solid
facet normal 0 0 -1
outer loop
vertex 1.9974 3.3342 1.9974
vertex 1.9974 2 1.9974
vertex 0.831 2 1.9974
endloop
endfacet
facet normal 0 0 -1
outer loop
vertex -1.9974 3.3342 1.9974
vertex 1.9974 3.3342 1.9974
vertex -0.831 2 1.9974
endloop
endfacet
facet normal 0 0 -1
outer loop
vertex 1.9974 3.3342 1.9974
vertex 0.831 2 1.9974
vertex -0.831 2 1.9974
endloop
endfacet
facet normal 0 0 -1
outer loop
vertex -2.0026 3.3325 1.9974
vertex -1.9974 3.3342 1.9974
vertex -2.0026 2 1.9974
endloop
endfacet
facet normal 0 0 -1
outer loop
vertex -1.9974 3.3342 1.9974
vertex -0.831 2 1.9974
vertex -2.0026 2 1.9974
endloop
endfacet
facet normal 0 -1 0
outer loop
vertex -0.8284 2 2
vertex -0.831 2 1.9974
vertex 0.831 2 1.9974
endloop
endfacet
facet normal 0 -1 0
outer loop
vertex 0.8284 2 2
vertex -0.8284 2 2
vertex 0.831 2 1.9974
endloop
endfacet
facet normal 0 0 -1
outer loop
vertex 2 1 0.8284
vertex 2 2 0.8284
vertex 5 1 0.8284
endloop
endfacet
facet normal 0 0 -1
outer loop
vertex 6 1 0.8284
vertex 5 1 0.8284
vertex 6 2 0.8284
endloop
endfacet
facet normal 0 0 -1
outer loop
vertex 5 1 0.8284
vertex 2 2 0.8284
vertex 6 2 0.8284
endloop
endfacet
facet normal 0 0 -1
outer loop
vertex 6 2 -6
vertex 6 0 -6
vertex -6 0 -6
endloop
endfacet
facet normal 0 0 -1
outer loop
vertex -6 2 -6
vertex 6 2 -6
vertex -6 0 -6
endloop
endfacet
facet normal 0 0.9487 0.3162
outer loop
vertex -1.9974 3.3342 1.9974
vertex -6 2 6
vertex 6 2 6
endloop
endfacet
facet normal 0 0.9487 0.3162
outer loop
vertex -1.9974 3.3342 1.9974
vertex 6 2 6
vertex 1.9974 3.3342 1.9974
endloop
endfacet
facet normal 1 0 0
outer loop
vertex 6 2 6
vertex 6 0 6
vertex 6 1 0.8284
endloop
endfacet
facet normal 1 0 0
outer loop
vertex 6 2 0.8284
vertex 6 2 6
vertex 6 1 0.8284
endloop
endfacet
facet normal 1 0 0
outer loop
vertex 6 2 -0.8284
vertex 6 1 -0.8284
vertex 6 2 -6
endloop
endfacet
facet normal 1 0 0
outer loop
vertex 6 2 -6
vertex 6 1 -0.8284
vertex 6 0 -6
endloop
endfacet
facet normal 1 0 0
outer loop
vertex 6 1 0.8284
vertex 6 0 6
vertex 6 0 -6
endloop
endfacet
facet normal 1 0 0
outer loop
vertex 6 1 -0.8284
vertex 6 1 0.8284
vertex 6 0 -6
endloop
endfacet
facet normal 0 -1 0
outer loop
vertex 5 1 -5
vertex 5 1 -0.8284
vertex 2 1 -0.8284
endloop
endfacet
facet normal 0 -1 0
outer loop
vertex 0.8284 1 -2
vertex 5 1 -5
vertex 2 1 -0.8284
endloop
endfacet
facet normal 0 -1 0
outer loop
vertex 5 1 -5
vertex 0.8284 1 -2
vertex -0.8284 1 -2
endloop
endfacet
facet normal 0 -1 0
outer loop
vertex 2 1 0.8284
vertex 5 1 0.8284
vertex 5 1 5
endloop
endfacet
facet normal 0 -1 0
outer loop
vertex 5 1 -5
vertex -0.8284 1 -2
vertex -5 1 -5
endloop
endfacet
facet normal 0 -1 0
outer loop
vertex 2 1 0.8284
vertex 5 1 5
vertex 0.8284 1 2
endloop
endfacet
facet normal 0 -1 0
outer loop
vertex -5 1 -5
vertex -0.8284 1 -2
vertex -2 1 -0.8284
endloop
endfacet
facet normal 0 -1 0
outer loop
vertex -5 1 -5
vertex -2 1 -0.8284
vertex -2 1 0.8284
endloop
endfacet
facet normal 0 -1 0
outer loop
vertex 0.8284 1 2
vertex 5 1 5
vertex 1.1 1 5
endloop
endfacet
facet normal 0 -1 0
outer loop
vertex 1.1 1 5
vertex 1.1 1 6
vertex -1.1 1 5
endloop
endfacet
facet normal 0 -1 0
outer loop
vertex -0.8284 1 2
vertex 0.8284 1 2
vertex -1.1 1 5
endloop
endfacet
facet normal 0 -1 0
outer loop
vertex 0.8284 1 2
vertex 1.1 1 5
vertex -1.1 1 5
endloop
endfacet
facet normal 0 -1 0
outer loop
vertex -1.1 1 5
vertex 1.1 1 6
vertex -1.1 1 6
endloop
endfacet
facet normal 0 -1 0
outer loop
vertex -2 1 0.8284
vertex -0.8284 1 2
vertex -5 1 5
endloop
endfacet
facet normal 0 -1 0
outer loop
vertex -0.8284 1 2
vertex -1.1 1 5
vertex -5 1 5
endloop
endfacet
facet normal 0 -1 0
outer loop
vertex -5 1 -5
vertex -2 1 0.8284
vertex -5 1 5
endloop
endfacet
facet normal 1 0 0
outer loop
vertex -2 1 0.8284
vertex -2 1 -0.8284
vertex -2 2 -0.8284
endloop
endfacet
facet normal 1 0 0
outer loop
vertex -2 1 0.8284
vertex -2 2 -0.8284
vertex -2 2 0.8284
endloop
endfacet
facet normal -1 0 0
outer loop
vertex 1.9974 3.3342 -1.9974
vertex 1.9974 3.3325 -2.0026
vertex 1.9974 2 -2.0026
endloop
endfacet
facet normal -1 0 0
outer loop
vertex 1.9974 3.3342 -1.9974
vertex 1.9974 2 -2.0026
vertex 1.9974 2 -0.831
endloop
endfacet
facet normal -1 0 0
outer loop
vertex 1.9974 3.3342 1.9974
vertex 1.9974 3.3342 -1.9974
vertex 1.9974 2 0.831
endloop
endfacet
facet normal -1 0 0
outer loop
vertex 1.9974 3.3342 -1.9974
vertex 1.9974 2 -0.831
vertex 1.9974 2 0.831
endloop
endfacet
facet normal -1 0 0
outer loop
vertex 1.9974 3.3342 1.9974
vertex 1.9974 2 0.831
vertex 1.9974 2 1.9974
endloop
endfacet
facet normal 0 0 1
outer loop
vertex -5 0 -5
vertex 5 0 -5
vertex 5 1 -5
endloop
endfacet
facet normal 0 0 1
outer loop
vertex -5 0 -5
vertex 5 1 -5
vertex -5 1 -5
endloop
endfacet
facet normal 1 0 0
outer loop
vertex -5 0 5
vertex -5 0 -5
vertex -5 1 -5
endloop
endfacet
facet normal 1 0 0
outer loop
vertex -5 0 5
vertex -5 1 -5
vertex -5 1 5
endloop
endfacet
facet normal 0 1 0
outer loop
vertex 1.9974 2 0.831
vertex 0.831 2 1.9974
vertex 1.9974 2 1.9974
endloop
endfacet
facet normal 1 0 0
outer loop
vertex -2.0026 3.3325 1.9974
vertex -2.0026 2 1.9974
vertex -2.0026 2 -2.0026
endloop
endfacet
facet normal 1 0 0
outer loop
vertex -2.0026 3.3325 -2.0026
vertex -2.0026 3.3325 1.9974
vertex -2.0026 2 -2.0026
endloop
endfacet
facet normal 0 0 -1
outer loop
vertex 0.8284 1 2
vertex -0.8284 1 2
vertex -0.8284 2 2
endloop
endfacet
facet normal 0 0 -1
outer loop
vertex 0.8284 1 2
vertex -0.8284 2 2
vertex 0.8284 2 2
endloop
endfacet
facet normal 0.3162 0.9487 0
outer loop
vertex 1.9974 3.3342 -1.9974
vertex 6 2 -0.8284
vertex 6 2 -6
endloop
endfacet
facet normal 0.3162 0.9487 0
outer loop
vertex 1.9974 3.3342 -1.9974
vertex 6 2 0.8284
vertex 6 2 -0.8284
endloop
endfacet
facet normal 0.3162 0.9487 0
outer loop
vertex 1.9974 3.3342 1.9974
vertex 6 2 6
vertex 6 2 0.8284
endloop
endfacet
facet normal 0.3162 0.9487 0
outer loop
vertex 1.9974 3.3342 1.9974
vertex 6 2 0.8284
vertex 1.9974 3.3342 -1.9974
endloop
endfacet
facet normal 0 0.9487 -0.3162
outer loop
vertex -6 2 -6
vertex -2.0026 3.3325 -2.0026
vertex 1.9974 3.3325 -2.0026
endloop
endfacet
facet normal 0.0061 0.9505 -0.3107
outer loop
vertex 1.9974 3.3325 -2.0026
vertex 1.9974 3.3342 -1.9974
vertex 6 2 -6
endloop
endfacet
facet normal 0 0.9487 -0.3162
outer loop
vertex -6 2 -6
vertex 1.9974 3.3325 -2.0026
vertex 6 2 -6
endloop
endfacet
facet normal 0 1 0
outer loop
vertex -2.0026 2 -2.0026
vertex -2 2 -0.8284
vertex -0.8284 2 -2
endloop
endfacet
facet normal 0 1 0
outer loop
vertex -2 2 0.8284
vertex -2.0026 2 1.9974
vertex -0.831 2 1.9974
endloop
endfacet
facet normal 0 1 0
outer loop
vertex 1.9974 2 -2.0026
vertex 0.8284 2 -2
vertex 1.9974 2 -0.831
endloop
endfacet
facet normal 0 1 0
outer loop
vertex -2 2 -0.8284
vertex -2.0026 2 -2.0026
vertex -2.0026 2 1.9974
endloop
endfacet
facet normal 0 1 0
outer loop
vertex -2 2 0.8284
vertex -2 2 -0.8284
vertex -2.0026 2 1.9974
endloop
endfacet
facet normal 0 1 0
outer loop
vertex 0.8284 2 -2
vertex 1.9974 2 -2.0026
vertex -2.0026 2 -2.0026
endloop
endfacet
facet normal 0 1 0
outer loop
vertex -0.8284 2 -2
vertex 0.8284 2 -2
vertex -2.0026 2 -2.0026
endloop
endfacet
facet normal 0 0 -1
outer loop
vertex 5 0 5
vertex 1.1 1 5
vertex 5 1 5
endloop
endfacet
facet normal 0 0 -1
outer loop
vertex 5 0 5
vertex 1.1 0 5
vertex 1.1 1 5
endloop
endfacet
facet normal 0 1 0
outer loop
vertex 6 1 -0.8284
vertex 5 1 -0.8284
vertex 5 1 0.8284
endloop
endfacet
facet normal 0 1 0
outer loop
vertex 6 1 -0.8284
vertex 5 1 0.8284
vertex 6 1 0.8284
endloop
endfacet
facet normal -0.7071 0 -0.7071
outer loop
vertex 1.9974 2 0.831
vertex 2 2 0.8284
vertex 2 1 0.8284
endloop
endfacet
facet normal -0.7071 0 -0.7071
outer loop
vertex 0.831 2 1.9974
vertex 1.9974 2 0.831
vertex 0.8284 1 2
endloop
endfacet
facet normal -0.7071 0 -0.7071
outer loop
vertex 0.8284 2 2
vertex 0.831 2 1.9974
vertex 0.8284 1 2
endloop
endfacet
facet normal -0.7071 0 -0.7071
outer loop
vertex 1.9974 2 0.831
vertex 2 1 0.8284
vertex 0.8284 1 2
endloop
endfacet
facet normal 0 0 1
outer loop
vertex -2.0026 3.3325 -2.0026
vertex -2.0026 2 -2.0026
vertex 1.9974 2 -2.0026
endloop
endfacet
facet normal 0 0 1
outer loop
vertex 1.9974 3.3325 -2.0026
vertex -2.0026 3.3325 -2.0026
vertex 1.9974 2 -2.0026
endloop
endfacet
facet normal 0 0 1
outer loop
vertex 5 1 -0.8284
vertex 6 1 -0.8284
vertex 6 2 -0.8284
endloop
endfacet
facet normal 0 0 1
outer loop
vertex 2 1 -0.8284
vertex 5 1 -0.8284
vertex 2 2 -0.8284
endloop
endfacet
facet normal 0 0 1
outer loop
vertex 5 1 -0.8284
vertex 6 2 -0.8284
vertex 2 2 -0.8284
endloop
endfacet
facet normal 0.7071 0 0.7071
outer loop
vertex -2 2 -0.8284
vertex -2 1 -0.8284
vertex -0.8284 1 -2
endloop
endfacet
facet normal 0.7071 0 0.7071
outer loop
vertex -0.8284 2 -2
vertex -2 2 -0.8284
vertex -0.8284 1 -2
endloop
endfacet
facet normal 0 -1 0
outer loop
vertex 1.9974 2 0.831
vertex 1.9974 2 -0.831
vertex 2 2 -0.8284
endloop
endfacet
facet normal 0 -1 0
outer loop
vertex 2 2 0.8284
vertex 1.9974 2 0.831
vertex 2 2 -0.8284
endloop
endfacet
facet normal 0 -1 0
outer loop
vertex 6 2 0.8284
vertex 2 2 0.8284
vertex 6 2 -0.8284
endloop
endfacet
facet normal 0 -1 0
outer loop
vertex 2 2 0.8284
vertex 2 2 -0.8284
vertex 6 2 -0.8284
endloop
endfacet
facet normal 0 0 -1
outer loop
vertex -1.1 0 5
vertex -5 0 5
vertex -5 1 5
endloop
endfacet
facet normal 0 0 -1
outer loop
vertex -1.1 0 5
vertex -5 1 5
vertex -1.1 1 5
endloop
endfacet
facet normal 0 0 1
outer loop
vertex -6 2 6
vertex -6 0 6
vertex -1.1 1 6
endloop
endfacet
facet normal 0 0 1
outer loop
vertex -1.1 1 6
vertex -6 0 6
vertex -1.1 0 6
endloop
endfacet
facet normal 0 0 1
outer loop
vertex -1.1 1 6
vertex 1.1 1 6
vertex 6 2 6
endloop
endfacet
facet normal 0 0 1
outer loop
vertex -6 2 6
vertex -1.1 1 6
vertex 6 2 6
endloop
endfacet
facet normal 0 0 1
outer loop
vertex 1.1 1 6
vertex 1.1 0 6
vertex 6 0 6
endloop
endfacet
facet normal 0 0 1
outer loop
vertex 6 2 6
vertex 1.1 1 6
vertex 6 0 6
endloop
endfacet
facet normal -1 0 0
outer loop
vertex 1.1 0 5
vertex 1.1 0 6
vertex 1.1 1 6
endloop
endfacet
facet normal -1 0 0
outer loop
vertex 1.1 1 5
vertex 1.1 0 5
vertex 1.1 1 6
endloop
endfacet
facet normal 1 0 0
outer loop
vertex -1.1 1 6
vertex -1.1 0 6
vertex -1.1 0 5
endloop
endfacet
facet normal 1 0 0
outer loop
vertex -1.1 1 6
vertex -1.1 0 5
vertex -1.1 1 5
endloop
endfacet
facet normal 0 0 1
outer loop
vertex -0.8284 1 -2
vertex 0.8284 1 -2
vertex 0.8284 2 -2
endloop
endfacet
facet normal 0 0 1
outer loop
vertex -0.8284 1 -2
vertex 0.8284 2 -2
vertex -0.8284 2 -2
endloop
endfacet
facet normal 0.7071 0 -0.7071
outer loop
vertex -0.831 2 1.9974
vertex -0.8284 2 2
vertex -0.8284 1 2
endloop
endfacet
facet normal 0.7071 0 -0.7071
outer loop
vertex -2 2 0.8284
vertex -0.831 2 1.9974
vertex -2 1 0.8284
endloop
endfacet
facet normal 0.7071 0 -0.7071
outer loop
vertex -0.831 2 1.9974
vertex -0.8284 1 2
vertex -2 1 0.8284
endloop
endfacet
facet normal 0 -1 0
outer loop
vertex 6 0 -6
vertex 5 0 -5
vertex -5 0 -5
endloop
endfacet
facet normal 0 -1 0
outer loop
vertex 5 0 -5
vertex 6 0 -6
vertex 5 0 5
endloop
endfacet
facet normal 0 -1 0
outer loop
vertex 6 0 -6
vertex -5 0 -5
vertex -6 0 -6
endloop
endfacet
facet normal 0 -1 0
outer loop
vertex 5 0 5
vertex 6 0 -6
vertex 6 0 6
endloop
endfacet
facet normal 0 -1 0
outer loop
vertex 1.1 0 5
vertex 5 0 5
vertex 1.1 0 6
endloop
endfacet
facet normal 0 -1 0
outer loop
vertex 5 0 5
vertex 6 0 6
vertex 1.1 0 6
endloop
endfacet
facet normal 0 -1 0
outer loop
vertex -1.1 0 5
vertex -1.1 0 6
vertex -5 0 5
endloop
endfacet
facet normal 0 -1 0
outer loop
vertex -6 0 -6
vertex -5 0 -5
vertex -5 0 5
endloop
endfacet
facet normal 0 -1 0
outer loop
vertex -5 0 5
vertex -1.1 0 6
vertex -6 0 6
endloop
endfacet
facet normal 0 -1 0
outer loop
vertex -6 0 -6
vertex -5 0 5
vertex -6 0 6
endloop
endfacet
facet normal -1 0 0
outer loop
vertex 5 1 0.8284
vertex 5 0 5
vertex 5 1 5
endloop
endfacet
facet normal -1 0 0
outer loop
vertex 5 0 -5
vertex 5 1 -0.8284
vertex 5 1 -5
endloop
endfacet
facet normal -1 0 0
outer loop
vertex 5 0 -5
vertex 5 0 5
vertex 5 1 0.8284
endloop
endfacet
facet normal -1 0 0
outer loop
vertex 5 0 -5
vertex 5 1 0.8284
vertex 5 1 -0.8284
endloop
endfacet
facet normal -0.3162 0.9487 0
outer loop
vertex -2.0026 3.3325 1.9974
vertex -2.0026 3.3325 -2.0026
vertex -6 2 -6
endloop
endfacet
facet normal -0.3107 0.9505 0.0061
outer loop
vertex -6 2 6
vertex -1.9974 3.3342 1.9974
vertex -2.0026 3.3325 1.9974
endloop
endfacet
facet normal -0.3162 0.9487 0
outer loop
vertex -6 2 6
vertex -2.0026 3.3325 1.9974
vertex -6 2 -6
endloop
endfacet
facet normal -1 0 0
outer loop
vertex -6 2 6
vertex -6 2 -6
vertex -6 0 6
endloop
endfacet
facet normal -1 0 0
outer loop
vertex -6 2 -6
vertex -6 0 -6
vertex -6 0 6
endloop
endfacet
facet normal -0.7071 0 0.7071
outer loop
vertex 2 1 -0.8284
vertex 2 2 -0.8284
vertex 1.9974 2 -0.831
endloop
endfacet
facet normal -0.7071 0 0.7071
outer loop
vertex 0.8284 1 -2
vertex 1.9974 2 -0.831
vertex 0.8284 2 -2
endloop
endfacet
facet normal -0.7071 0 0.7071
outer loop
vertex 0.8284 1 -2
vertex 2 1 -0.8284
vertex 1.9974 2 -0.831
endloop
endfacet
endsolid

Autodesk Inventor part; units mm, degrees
ref_plane "YZ Plane" through (0, 0, 0) normal (1, 0, 0) x (0, 1, 0)
ref_plane "XZ Plane" through (0, 0, 0) normal (0, 1, 0) x (-1, 0, 0)
ref_plane "XY Plane" through (0, 0, 0) normal (0, 0, 1) x (1, 0, 0)
sketch "Sketch1" plane through (0, 0, 0) normal (0, 1, 0) x (-1, 0, 0)
  line L0 (5, 5) -> (-5, 5)
  line L1 (-5, 5) -> (-5, -5)
  line L2 (-5, -5) -> (5, -5)
  line L3 (5, -5) -> (5, 5)
  line L4 (6, 6) -> (-6, 6)
  line L5 (-6, 6) -> (-6, -6)
  line L6 (-6, -6) -> (6, -6)
  line L7 (6, -6) -> (6, 6)
  point P0 (0, 0)
  dimension "d0" = 10
  dimension "d1" = 10
  dimension "d2" = 5
  dimension "d3" = 5
  dimension "d4" = 12
  dimension "d5" = 12
  dimension "d6" = 1
  dimension "d7" = 1
extrude "Extrusion1" add sketch "Sketch1" along normal blind 2
sketch "Sketch2" plane through (6, 0, 6) normal (1, 0, 0) x (0, 0, -1)
  line L0 (0, 0) -> (0, 2) projected
  line L1 (12, 0) -> (12, 2) projected
  line L2 (0, 2) -> (12, 2)
  line L3 (12, 2) -> (12, 1)
  line L4 (12, 1) -> (0, 1)
  line L5 (0, 1) -> (0, 2)
  point P0 (6, 0)
extrude "Extrusion2" add sketch "Sketch2" against normal blind 11.5
sketch "Sketch3" plane through (0, 2, 0) normal (0, 1, 0) x (1, 0, 0)
  line L0 (-2, -2) -> (2, -2)
  line L1 (2, -2) -> (2, 2)
  line L2 (2, 2) -> (-2, 2)
  line L3 (-2, 2) -> (-2, -2)
  circle A0 centre (0, 0) radius 2.8284
  line L4 (0, -2.8284) -> (-2.8284, 0)
  line L5 (-2.8284, 0) -> (0, 2.8284)
  line L6 (2.8284, 0) -> (0, 2.8284)
  line L7 (2.8284, 0) -> (0, -2.8284)
  point P0 (0.8284, -2)
  point P1 (2, -0.8284)
  point P2 (2, 0.8284)
  point P3 (0.8284, 2)
  point P4 (-0.8284, 2)
  point P5 (-2, 0.8284)
  point P6 (-2, -0.8284)
  point P7 (-0.8284, -2)
  dimension "d13" = 4
  dimension "d14" = 4
  dimension "d15" = 2
  dimension "d16" = 2
extrude "Extrusion3" cut sketch "Sketch3" along normal blind 23.25 and the other way blind 11.625 contours L4 L3 L5 L2 L6 L1 L7 L0
sketch "Sketch4" plane through (0, 2, 0) normal (0, 1, 0) x (1, 0, 0)
  line L0 (2, -0.8284) -> (2, 0.8284) projected
  line L1 (2, -0.8284) -> (2.8765, -0.8284)
  line L2 (2.8765, -0.8284) -> (2.8765, 0.8284)
  line L3 (2.8765, 0.8284) -> (2, 0.8284)
  line L4 (2, 0.8284) -> (2, -0.8284)
  line L5 (2.8765, -0.8284) -> (7.5124, -0.8284)
  line L6 (7.5124, -0.8284) -> (7.5124, 0.8284)
  line L7 (7.5124, 0.8284) -> (2.8765, 0.8284)
  line L8 (2.8765, 0.8284) -> (2.8765, -0.8284)
  point P0 (0, 0)
  point P1 (2.8765, 0.8284)
  point P2 (2, 0.8284)
extrude "Extrusion4" cut sketch "Sketch4" against normal blind 1
sketch "Sketch5" plane through (0, 2, 0) normal (0, 1, 0) x (1, 0, 0)
  line L0 (-6, -6) -> (6, -6) projected
  line L1 (6, 0.8284) -> (6, 6) projected
  line L2 (-6, -6) -> (6, -6)
  line L3 (6, -6) -> (6, 6)
  line L4 (6, 6) -> (-6, 6)
  line L5 (-6, 6) -> (-6, -6)
  point P0 (0, 0)
  point P1 (6, -6)
extrude "Extrusion5" add sketch "Sketch5" along normal blind 25
sketch "Sketch6" plane through (6, 0, 6) normal (1, 0, 0) x (0, 0, -1)
  line L0 (5.1716, 1) -> (5.1716, 2) projected
  line L1 (5.1716, 2) -> (-3.596, 2)
  line L2 (0, 0) -> (0, 27) projected
  line L3 (4, 2) -> (5.1716, 2) projected
  line L4 (5.1716, 2) -> (16.1787, 2)
  line L5 (5.1716, 2) -> (6.8284, 2) projected
  line L6 (6, 2) -> (6, 6)
  line L7 (0, 2) -> (6, 4)
  line L8 (6, 4) -> (12, 2)
  line L9 (12, 0) -> (12, 27) projected
  line L10 (12, 2) -> (-2.4689, 2)
  line L11 (-2.4689, 2) -> (-2.4689, 28.669)
  line L12 (-2.4689, 28.669) -> (12, 28.669)
  line L13 (12, 28.669) -> (12, 2)
  point P0 (6, 0)
  dimension "d23" = 4
extrude "Extrusion6" cut sketch "Sketch6" against normal blind 23.25 contours L1 L11 L12 L13 L9 L8 L7
sketch "Sketch7" plane through (-6, 0, 6) normal (0, 0, 1) x (1, 0, 0)
  line L0 (6, 0) -> (6, 4)
  line L1 (12, 4) -> (0, 4) projected
  line L2 (0, 2) -> (12, 2) projected
  line L3 (12, 2) -> (6, 4)
  line L4 (0, 4) -> (0, 2) projected
  line L5 (6, 4) -> (0, 2)
  line L6 (0, 2) -> (13.6732, 2)
  line L7 (13.6732, 2) -> (13.6732, 4.9606)
  line L8 (13.6732, 4.9606) -> (0, 4.9606)
  line L9 (0, 4.9606) -> (0, 2)
extrude "Extrusion7" cut sketch "Sketch7" against normal blind 41.75 contours L5 L4 L1 | L1 L9 L8 L7 L6 L3
sketch "Sketch8" plane through (0, 2, 0) normal (0, -1, 0) x (1, 0, 0)
  line L0 (6, 6) -> (0, 0) projected
  line L1 (1.9974, 1.9974) -> (-2.0026, 1.9974)
  line L2 (-2.0026, 1.9974) -> (-2.0026, -2.0026)
  line L3 (-2.0026, -2.0026) -> (1.9974, -2.0026)
  line L4 (1.9974, -2.0026) -> (1.9974, 1.9974)
  dimension "d30" = 4
  dimension "d31" = 4
extrude "Extrusion8" cut sketch "Sketch8" against normal blind 105
sketch "Sketch9" plane through (-6, 0, 6) normal (0, 0, 1) x (1, 0, 0)
  line L0 (8, 1) -> (6.8284, 1) projected
  line L1 (6, 0) -> (7.1, 0)
  line L2 (7.1, 0) -> (7.1, 1)
  line L3 (7.1, 1) -> (6, 1)
  line L4 (6, 1) -> (6, 0)
  line L5 (5.1716, 1) -> (4, 1) projected
  line L6 (6, 0) -> (4.9, 0)
  line L7 (4.9, 0) -> (4.9, 1)
  line L8 (4.9, 1) -> (6, 1)
  line L9 (6, 1) -> (6, 0)
  dimension "d34" = 1.1
  dimension "d35" = 1.1
extrude "Extrusion9" cut sketch "Sketch9" against normal blind 2.75
equation "\"d2\" = 0.5 * d0"
equation "\"d3\" = 0.5 * d1"
equation "\"d15\" = 0.5 * d13"
equation "\"d16\" = 0.5 * d14"
equation "\"BendRadius\" = Thickness"
equation "\"BendReliefWidth\" = Thickness"
equation "\"BendReliefDepth\" = 0.5 * Thickness"
equation "\"CornerReliefSize\" = 4 * Thickness"
equation "\"MinimumRemnant\" = 2 * Thickness"
equation "\"TransitionRadius\" = BendRadius"
equation "\"JacobiRadiusSize\" = BendRadius"
equation "\"GapSize\" = Thickness"
equation "\"Thickness\" = 0.5"
properties part number "modelGatePoklice1"
